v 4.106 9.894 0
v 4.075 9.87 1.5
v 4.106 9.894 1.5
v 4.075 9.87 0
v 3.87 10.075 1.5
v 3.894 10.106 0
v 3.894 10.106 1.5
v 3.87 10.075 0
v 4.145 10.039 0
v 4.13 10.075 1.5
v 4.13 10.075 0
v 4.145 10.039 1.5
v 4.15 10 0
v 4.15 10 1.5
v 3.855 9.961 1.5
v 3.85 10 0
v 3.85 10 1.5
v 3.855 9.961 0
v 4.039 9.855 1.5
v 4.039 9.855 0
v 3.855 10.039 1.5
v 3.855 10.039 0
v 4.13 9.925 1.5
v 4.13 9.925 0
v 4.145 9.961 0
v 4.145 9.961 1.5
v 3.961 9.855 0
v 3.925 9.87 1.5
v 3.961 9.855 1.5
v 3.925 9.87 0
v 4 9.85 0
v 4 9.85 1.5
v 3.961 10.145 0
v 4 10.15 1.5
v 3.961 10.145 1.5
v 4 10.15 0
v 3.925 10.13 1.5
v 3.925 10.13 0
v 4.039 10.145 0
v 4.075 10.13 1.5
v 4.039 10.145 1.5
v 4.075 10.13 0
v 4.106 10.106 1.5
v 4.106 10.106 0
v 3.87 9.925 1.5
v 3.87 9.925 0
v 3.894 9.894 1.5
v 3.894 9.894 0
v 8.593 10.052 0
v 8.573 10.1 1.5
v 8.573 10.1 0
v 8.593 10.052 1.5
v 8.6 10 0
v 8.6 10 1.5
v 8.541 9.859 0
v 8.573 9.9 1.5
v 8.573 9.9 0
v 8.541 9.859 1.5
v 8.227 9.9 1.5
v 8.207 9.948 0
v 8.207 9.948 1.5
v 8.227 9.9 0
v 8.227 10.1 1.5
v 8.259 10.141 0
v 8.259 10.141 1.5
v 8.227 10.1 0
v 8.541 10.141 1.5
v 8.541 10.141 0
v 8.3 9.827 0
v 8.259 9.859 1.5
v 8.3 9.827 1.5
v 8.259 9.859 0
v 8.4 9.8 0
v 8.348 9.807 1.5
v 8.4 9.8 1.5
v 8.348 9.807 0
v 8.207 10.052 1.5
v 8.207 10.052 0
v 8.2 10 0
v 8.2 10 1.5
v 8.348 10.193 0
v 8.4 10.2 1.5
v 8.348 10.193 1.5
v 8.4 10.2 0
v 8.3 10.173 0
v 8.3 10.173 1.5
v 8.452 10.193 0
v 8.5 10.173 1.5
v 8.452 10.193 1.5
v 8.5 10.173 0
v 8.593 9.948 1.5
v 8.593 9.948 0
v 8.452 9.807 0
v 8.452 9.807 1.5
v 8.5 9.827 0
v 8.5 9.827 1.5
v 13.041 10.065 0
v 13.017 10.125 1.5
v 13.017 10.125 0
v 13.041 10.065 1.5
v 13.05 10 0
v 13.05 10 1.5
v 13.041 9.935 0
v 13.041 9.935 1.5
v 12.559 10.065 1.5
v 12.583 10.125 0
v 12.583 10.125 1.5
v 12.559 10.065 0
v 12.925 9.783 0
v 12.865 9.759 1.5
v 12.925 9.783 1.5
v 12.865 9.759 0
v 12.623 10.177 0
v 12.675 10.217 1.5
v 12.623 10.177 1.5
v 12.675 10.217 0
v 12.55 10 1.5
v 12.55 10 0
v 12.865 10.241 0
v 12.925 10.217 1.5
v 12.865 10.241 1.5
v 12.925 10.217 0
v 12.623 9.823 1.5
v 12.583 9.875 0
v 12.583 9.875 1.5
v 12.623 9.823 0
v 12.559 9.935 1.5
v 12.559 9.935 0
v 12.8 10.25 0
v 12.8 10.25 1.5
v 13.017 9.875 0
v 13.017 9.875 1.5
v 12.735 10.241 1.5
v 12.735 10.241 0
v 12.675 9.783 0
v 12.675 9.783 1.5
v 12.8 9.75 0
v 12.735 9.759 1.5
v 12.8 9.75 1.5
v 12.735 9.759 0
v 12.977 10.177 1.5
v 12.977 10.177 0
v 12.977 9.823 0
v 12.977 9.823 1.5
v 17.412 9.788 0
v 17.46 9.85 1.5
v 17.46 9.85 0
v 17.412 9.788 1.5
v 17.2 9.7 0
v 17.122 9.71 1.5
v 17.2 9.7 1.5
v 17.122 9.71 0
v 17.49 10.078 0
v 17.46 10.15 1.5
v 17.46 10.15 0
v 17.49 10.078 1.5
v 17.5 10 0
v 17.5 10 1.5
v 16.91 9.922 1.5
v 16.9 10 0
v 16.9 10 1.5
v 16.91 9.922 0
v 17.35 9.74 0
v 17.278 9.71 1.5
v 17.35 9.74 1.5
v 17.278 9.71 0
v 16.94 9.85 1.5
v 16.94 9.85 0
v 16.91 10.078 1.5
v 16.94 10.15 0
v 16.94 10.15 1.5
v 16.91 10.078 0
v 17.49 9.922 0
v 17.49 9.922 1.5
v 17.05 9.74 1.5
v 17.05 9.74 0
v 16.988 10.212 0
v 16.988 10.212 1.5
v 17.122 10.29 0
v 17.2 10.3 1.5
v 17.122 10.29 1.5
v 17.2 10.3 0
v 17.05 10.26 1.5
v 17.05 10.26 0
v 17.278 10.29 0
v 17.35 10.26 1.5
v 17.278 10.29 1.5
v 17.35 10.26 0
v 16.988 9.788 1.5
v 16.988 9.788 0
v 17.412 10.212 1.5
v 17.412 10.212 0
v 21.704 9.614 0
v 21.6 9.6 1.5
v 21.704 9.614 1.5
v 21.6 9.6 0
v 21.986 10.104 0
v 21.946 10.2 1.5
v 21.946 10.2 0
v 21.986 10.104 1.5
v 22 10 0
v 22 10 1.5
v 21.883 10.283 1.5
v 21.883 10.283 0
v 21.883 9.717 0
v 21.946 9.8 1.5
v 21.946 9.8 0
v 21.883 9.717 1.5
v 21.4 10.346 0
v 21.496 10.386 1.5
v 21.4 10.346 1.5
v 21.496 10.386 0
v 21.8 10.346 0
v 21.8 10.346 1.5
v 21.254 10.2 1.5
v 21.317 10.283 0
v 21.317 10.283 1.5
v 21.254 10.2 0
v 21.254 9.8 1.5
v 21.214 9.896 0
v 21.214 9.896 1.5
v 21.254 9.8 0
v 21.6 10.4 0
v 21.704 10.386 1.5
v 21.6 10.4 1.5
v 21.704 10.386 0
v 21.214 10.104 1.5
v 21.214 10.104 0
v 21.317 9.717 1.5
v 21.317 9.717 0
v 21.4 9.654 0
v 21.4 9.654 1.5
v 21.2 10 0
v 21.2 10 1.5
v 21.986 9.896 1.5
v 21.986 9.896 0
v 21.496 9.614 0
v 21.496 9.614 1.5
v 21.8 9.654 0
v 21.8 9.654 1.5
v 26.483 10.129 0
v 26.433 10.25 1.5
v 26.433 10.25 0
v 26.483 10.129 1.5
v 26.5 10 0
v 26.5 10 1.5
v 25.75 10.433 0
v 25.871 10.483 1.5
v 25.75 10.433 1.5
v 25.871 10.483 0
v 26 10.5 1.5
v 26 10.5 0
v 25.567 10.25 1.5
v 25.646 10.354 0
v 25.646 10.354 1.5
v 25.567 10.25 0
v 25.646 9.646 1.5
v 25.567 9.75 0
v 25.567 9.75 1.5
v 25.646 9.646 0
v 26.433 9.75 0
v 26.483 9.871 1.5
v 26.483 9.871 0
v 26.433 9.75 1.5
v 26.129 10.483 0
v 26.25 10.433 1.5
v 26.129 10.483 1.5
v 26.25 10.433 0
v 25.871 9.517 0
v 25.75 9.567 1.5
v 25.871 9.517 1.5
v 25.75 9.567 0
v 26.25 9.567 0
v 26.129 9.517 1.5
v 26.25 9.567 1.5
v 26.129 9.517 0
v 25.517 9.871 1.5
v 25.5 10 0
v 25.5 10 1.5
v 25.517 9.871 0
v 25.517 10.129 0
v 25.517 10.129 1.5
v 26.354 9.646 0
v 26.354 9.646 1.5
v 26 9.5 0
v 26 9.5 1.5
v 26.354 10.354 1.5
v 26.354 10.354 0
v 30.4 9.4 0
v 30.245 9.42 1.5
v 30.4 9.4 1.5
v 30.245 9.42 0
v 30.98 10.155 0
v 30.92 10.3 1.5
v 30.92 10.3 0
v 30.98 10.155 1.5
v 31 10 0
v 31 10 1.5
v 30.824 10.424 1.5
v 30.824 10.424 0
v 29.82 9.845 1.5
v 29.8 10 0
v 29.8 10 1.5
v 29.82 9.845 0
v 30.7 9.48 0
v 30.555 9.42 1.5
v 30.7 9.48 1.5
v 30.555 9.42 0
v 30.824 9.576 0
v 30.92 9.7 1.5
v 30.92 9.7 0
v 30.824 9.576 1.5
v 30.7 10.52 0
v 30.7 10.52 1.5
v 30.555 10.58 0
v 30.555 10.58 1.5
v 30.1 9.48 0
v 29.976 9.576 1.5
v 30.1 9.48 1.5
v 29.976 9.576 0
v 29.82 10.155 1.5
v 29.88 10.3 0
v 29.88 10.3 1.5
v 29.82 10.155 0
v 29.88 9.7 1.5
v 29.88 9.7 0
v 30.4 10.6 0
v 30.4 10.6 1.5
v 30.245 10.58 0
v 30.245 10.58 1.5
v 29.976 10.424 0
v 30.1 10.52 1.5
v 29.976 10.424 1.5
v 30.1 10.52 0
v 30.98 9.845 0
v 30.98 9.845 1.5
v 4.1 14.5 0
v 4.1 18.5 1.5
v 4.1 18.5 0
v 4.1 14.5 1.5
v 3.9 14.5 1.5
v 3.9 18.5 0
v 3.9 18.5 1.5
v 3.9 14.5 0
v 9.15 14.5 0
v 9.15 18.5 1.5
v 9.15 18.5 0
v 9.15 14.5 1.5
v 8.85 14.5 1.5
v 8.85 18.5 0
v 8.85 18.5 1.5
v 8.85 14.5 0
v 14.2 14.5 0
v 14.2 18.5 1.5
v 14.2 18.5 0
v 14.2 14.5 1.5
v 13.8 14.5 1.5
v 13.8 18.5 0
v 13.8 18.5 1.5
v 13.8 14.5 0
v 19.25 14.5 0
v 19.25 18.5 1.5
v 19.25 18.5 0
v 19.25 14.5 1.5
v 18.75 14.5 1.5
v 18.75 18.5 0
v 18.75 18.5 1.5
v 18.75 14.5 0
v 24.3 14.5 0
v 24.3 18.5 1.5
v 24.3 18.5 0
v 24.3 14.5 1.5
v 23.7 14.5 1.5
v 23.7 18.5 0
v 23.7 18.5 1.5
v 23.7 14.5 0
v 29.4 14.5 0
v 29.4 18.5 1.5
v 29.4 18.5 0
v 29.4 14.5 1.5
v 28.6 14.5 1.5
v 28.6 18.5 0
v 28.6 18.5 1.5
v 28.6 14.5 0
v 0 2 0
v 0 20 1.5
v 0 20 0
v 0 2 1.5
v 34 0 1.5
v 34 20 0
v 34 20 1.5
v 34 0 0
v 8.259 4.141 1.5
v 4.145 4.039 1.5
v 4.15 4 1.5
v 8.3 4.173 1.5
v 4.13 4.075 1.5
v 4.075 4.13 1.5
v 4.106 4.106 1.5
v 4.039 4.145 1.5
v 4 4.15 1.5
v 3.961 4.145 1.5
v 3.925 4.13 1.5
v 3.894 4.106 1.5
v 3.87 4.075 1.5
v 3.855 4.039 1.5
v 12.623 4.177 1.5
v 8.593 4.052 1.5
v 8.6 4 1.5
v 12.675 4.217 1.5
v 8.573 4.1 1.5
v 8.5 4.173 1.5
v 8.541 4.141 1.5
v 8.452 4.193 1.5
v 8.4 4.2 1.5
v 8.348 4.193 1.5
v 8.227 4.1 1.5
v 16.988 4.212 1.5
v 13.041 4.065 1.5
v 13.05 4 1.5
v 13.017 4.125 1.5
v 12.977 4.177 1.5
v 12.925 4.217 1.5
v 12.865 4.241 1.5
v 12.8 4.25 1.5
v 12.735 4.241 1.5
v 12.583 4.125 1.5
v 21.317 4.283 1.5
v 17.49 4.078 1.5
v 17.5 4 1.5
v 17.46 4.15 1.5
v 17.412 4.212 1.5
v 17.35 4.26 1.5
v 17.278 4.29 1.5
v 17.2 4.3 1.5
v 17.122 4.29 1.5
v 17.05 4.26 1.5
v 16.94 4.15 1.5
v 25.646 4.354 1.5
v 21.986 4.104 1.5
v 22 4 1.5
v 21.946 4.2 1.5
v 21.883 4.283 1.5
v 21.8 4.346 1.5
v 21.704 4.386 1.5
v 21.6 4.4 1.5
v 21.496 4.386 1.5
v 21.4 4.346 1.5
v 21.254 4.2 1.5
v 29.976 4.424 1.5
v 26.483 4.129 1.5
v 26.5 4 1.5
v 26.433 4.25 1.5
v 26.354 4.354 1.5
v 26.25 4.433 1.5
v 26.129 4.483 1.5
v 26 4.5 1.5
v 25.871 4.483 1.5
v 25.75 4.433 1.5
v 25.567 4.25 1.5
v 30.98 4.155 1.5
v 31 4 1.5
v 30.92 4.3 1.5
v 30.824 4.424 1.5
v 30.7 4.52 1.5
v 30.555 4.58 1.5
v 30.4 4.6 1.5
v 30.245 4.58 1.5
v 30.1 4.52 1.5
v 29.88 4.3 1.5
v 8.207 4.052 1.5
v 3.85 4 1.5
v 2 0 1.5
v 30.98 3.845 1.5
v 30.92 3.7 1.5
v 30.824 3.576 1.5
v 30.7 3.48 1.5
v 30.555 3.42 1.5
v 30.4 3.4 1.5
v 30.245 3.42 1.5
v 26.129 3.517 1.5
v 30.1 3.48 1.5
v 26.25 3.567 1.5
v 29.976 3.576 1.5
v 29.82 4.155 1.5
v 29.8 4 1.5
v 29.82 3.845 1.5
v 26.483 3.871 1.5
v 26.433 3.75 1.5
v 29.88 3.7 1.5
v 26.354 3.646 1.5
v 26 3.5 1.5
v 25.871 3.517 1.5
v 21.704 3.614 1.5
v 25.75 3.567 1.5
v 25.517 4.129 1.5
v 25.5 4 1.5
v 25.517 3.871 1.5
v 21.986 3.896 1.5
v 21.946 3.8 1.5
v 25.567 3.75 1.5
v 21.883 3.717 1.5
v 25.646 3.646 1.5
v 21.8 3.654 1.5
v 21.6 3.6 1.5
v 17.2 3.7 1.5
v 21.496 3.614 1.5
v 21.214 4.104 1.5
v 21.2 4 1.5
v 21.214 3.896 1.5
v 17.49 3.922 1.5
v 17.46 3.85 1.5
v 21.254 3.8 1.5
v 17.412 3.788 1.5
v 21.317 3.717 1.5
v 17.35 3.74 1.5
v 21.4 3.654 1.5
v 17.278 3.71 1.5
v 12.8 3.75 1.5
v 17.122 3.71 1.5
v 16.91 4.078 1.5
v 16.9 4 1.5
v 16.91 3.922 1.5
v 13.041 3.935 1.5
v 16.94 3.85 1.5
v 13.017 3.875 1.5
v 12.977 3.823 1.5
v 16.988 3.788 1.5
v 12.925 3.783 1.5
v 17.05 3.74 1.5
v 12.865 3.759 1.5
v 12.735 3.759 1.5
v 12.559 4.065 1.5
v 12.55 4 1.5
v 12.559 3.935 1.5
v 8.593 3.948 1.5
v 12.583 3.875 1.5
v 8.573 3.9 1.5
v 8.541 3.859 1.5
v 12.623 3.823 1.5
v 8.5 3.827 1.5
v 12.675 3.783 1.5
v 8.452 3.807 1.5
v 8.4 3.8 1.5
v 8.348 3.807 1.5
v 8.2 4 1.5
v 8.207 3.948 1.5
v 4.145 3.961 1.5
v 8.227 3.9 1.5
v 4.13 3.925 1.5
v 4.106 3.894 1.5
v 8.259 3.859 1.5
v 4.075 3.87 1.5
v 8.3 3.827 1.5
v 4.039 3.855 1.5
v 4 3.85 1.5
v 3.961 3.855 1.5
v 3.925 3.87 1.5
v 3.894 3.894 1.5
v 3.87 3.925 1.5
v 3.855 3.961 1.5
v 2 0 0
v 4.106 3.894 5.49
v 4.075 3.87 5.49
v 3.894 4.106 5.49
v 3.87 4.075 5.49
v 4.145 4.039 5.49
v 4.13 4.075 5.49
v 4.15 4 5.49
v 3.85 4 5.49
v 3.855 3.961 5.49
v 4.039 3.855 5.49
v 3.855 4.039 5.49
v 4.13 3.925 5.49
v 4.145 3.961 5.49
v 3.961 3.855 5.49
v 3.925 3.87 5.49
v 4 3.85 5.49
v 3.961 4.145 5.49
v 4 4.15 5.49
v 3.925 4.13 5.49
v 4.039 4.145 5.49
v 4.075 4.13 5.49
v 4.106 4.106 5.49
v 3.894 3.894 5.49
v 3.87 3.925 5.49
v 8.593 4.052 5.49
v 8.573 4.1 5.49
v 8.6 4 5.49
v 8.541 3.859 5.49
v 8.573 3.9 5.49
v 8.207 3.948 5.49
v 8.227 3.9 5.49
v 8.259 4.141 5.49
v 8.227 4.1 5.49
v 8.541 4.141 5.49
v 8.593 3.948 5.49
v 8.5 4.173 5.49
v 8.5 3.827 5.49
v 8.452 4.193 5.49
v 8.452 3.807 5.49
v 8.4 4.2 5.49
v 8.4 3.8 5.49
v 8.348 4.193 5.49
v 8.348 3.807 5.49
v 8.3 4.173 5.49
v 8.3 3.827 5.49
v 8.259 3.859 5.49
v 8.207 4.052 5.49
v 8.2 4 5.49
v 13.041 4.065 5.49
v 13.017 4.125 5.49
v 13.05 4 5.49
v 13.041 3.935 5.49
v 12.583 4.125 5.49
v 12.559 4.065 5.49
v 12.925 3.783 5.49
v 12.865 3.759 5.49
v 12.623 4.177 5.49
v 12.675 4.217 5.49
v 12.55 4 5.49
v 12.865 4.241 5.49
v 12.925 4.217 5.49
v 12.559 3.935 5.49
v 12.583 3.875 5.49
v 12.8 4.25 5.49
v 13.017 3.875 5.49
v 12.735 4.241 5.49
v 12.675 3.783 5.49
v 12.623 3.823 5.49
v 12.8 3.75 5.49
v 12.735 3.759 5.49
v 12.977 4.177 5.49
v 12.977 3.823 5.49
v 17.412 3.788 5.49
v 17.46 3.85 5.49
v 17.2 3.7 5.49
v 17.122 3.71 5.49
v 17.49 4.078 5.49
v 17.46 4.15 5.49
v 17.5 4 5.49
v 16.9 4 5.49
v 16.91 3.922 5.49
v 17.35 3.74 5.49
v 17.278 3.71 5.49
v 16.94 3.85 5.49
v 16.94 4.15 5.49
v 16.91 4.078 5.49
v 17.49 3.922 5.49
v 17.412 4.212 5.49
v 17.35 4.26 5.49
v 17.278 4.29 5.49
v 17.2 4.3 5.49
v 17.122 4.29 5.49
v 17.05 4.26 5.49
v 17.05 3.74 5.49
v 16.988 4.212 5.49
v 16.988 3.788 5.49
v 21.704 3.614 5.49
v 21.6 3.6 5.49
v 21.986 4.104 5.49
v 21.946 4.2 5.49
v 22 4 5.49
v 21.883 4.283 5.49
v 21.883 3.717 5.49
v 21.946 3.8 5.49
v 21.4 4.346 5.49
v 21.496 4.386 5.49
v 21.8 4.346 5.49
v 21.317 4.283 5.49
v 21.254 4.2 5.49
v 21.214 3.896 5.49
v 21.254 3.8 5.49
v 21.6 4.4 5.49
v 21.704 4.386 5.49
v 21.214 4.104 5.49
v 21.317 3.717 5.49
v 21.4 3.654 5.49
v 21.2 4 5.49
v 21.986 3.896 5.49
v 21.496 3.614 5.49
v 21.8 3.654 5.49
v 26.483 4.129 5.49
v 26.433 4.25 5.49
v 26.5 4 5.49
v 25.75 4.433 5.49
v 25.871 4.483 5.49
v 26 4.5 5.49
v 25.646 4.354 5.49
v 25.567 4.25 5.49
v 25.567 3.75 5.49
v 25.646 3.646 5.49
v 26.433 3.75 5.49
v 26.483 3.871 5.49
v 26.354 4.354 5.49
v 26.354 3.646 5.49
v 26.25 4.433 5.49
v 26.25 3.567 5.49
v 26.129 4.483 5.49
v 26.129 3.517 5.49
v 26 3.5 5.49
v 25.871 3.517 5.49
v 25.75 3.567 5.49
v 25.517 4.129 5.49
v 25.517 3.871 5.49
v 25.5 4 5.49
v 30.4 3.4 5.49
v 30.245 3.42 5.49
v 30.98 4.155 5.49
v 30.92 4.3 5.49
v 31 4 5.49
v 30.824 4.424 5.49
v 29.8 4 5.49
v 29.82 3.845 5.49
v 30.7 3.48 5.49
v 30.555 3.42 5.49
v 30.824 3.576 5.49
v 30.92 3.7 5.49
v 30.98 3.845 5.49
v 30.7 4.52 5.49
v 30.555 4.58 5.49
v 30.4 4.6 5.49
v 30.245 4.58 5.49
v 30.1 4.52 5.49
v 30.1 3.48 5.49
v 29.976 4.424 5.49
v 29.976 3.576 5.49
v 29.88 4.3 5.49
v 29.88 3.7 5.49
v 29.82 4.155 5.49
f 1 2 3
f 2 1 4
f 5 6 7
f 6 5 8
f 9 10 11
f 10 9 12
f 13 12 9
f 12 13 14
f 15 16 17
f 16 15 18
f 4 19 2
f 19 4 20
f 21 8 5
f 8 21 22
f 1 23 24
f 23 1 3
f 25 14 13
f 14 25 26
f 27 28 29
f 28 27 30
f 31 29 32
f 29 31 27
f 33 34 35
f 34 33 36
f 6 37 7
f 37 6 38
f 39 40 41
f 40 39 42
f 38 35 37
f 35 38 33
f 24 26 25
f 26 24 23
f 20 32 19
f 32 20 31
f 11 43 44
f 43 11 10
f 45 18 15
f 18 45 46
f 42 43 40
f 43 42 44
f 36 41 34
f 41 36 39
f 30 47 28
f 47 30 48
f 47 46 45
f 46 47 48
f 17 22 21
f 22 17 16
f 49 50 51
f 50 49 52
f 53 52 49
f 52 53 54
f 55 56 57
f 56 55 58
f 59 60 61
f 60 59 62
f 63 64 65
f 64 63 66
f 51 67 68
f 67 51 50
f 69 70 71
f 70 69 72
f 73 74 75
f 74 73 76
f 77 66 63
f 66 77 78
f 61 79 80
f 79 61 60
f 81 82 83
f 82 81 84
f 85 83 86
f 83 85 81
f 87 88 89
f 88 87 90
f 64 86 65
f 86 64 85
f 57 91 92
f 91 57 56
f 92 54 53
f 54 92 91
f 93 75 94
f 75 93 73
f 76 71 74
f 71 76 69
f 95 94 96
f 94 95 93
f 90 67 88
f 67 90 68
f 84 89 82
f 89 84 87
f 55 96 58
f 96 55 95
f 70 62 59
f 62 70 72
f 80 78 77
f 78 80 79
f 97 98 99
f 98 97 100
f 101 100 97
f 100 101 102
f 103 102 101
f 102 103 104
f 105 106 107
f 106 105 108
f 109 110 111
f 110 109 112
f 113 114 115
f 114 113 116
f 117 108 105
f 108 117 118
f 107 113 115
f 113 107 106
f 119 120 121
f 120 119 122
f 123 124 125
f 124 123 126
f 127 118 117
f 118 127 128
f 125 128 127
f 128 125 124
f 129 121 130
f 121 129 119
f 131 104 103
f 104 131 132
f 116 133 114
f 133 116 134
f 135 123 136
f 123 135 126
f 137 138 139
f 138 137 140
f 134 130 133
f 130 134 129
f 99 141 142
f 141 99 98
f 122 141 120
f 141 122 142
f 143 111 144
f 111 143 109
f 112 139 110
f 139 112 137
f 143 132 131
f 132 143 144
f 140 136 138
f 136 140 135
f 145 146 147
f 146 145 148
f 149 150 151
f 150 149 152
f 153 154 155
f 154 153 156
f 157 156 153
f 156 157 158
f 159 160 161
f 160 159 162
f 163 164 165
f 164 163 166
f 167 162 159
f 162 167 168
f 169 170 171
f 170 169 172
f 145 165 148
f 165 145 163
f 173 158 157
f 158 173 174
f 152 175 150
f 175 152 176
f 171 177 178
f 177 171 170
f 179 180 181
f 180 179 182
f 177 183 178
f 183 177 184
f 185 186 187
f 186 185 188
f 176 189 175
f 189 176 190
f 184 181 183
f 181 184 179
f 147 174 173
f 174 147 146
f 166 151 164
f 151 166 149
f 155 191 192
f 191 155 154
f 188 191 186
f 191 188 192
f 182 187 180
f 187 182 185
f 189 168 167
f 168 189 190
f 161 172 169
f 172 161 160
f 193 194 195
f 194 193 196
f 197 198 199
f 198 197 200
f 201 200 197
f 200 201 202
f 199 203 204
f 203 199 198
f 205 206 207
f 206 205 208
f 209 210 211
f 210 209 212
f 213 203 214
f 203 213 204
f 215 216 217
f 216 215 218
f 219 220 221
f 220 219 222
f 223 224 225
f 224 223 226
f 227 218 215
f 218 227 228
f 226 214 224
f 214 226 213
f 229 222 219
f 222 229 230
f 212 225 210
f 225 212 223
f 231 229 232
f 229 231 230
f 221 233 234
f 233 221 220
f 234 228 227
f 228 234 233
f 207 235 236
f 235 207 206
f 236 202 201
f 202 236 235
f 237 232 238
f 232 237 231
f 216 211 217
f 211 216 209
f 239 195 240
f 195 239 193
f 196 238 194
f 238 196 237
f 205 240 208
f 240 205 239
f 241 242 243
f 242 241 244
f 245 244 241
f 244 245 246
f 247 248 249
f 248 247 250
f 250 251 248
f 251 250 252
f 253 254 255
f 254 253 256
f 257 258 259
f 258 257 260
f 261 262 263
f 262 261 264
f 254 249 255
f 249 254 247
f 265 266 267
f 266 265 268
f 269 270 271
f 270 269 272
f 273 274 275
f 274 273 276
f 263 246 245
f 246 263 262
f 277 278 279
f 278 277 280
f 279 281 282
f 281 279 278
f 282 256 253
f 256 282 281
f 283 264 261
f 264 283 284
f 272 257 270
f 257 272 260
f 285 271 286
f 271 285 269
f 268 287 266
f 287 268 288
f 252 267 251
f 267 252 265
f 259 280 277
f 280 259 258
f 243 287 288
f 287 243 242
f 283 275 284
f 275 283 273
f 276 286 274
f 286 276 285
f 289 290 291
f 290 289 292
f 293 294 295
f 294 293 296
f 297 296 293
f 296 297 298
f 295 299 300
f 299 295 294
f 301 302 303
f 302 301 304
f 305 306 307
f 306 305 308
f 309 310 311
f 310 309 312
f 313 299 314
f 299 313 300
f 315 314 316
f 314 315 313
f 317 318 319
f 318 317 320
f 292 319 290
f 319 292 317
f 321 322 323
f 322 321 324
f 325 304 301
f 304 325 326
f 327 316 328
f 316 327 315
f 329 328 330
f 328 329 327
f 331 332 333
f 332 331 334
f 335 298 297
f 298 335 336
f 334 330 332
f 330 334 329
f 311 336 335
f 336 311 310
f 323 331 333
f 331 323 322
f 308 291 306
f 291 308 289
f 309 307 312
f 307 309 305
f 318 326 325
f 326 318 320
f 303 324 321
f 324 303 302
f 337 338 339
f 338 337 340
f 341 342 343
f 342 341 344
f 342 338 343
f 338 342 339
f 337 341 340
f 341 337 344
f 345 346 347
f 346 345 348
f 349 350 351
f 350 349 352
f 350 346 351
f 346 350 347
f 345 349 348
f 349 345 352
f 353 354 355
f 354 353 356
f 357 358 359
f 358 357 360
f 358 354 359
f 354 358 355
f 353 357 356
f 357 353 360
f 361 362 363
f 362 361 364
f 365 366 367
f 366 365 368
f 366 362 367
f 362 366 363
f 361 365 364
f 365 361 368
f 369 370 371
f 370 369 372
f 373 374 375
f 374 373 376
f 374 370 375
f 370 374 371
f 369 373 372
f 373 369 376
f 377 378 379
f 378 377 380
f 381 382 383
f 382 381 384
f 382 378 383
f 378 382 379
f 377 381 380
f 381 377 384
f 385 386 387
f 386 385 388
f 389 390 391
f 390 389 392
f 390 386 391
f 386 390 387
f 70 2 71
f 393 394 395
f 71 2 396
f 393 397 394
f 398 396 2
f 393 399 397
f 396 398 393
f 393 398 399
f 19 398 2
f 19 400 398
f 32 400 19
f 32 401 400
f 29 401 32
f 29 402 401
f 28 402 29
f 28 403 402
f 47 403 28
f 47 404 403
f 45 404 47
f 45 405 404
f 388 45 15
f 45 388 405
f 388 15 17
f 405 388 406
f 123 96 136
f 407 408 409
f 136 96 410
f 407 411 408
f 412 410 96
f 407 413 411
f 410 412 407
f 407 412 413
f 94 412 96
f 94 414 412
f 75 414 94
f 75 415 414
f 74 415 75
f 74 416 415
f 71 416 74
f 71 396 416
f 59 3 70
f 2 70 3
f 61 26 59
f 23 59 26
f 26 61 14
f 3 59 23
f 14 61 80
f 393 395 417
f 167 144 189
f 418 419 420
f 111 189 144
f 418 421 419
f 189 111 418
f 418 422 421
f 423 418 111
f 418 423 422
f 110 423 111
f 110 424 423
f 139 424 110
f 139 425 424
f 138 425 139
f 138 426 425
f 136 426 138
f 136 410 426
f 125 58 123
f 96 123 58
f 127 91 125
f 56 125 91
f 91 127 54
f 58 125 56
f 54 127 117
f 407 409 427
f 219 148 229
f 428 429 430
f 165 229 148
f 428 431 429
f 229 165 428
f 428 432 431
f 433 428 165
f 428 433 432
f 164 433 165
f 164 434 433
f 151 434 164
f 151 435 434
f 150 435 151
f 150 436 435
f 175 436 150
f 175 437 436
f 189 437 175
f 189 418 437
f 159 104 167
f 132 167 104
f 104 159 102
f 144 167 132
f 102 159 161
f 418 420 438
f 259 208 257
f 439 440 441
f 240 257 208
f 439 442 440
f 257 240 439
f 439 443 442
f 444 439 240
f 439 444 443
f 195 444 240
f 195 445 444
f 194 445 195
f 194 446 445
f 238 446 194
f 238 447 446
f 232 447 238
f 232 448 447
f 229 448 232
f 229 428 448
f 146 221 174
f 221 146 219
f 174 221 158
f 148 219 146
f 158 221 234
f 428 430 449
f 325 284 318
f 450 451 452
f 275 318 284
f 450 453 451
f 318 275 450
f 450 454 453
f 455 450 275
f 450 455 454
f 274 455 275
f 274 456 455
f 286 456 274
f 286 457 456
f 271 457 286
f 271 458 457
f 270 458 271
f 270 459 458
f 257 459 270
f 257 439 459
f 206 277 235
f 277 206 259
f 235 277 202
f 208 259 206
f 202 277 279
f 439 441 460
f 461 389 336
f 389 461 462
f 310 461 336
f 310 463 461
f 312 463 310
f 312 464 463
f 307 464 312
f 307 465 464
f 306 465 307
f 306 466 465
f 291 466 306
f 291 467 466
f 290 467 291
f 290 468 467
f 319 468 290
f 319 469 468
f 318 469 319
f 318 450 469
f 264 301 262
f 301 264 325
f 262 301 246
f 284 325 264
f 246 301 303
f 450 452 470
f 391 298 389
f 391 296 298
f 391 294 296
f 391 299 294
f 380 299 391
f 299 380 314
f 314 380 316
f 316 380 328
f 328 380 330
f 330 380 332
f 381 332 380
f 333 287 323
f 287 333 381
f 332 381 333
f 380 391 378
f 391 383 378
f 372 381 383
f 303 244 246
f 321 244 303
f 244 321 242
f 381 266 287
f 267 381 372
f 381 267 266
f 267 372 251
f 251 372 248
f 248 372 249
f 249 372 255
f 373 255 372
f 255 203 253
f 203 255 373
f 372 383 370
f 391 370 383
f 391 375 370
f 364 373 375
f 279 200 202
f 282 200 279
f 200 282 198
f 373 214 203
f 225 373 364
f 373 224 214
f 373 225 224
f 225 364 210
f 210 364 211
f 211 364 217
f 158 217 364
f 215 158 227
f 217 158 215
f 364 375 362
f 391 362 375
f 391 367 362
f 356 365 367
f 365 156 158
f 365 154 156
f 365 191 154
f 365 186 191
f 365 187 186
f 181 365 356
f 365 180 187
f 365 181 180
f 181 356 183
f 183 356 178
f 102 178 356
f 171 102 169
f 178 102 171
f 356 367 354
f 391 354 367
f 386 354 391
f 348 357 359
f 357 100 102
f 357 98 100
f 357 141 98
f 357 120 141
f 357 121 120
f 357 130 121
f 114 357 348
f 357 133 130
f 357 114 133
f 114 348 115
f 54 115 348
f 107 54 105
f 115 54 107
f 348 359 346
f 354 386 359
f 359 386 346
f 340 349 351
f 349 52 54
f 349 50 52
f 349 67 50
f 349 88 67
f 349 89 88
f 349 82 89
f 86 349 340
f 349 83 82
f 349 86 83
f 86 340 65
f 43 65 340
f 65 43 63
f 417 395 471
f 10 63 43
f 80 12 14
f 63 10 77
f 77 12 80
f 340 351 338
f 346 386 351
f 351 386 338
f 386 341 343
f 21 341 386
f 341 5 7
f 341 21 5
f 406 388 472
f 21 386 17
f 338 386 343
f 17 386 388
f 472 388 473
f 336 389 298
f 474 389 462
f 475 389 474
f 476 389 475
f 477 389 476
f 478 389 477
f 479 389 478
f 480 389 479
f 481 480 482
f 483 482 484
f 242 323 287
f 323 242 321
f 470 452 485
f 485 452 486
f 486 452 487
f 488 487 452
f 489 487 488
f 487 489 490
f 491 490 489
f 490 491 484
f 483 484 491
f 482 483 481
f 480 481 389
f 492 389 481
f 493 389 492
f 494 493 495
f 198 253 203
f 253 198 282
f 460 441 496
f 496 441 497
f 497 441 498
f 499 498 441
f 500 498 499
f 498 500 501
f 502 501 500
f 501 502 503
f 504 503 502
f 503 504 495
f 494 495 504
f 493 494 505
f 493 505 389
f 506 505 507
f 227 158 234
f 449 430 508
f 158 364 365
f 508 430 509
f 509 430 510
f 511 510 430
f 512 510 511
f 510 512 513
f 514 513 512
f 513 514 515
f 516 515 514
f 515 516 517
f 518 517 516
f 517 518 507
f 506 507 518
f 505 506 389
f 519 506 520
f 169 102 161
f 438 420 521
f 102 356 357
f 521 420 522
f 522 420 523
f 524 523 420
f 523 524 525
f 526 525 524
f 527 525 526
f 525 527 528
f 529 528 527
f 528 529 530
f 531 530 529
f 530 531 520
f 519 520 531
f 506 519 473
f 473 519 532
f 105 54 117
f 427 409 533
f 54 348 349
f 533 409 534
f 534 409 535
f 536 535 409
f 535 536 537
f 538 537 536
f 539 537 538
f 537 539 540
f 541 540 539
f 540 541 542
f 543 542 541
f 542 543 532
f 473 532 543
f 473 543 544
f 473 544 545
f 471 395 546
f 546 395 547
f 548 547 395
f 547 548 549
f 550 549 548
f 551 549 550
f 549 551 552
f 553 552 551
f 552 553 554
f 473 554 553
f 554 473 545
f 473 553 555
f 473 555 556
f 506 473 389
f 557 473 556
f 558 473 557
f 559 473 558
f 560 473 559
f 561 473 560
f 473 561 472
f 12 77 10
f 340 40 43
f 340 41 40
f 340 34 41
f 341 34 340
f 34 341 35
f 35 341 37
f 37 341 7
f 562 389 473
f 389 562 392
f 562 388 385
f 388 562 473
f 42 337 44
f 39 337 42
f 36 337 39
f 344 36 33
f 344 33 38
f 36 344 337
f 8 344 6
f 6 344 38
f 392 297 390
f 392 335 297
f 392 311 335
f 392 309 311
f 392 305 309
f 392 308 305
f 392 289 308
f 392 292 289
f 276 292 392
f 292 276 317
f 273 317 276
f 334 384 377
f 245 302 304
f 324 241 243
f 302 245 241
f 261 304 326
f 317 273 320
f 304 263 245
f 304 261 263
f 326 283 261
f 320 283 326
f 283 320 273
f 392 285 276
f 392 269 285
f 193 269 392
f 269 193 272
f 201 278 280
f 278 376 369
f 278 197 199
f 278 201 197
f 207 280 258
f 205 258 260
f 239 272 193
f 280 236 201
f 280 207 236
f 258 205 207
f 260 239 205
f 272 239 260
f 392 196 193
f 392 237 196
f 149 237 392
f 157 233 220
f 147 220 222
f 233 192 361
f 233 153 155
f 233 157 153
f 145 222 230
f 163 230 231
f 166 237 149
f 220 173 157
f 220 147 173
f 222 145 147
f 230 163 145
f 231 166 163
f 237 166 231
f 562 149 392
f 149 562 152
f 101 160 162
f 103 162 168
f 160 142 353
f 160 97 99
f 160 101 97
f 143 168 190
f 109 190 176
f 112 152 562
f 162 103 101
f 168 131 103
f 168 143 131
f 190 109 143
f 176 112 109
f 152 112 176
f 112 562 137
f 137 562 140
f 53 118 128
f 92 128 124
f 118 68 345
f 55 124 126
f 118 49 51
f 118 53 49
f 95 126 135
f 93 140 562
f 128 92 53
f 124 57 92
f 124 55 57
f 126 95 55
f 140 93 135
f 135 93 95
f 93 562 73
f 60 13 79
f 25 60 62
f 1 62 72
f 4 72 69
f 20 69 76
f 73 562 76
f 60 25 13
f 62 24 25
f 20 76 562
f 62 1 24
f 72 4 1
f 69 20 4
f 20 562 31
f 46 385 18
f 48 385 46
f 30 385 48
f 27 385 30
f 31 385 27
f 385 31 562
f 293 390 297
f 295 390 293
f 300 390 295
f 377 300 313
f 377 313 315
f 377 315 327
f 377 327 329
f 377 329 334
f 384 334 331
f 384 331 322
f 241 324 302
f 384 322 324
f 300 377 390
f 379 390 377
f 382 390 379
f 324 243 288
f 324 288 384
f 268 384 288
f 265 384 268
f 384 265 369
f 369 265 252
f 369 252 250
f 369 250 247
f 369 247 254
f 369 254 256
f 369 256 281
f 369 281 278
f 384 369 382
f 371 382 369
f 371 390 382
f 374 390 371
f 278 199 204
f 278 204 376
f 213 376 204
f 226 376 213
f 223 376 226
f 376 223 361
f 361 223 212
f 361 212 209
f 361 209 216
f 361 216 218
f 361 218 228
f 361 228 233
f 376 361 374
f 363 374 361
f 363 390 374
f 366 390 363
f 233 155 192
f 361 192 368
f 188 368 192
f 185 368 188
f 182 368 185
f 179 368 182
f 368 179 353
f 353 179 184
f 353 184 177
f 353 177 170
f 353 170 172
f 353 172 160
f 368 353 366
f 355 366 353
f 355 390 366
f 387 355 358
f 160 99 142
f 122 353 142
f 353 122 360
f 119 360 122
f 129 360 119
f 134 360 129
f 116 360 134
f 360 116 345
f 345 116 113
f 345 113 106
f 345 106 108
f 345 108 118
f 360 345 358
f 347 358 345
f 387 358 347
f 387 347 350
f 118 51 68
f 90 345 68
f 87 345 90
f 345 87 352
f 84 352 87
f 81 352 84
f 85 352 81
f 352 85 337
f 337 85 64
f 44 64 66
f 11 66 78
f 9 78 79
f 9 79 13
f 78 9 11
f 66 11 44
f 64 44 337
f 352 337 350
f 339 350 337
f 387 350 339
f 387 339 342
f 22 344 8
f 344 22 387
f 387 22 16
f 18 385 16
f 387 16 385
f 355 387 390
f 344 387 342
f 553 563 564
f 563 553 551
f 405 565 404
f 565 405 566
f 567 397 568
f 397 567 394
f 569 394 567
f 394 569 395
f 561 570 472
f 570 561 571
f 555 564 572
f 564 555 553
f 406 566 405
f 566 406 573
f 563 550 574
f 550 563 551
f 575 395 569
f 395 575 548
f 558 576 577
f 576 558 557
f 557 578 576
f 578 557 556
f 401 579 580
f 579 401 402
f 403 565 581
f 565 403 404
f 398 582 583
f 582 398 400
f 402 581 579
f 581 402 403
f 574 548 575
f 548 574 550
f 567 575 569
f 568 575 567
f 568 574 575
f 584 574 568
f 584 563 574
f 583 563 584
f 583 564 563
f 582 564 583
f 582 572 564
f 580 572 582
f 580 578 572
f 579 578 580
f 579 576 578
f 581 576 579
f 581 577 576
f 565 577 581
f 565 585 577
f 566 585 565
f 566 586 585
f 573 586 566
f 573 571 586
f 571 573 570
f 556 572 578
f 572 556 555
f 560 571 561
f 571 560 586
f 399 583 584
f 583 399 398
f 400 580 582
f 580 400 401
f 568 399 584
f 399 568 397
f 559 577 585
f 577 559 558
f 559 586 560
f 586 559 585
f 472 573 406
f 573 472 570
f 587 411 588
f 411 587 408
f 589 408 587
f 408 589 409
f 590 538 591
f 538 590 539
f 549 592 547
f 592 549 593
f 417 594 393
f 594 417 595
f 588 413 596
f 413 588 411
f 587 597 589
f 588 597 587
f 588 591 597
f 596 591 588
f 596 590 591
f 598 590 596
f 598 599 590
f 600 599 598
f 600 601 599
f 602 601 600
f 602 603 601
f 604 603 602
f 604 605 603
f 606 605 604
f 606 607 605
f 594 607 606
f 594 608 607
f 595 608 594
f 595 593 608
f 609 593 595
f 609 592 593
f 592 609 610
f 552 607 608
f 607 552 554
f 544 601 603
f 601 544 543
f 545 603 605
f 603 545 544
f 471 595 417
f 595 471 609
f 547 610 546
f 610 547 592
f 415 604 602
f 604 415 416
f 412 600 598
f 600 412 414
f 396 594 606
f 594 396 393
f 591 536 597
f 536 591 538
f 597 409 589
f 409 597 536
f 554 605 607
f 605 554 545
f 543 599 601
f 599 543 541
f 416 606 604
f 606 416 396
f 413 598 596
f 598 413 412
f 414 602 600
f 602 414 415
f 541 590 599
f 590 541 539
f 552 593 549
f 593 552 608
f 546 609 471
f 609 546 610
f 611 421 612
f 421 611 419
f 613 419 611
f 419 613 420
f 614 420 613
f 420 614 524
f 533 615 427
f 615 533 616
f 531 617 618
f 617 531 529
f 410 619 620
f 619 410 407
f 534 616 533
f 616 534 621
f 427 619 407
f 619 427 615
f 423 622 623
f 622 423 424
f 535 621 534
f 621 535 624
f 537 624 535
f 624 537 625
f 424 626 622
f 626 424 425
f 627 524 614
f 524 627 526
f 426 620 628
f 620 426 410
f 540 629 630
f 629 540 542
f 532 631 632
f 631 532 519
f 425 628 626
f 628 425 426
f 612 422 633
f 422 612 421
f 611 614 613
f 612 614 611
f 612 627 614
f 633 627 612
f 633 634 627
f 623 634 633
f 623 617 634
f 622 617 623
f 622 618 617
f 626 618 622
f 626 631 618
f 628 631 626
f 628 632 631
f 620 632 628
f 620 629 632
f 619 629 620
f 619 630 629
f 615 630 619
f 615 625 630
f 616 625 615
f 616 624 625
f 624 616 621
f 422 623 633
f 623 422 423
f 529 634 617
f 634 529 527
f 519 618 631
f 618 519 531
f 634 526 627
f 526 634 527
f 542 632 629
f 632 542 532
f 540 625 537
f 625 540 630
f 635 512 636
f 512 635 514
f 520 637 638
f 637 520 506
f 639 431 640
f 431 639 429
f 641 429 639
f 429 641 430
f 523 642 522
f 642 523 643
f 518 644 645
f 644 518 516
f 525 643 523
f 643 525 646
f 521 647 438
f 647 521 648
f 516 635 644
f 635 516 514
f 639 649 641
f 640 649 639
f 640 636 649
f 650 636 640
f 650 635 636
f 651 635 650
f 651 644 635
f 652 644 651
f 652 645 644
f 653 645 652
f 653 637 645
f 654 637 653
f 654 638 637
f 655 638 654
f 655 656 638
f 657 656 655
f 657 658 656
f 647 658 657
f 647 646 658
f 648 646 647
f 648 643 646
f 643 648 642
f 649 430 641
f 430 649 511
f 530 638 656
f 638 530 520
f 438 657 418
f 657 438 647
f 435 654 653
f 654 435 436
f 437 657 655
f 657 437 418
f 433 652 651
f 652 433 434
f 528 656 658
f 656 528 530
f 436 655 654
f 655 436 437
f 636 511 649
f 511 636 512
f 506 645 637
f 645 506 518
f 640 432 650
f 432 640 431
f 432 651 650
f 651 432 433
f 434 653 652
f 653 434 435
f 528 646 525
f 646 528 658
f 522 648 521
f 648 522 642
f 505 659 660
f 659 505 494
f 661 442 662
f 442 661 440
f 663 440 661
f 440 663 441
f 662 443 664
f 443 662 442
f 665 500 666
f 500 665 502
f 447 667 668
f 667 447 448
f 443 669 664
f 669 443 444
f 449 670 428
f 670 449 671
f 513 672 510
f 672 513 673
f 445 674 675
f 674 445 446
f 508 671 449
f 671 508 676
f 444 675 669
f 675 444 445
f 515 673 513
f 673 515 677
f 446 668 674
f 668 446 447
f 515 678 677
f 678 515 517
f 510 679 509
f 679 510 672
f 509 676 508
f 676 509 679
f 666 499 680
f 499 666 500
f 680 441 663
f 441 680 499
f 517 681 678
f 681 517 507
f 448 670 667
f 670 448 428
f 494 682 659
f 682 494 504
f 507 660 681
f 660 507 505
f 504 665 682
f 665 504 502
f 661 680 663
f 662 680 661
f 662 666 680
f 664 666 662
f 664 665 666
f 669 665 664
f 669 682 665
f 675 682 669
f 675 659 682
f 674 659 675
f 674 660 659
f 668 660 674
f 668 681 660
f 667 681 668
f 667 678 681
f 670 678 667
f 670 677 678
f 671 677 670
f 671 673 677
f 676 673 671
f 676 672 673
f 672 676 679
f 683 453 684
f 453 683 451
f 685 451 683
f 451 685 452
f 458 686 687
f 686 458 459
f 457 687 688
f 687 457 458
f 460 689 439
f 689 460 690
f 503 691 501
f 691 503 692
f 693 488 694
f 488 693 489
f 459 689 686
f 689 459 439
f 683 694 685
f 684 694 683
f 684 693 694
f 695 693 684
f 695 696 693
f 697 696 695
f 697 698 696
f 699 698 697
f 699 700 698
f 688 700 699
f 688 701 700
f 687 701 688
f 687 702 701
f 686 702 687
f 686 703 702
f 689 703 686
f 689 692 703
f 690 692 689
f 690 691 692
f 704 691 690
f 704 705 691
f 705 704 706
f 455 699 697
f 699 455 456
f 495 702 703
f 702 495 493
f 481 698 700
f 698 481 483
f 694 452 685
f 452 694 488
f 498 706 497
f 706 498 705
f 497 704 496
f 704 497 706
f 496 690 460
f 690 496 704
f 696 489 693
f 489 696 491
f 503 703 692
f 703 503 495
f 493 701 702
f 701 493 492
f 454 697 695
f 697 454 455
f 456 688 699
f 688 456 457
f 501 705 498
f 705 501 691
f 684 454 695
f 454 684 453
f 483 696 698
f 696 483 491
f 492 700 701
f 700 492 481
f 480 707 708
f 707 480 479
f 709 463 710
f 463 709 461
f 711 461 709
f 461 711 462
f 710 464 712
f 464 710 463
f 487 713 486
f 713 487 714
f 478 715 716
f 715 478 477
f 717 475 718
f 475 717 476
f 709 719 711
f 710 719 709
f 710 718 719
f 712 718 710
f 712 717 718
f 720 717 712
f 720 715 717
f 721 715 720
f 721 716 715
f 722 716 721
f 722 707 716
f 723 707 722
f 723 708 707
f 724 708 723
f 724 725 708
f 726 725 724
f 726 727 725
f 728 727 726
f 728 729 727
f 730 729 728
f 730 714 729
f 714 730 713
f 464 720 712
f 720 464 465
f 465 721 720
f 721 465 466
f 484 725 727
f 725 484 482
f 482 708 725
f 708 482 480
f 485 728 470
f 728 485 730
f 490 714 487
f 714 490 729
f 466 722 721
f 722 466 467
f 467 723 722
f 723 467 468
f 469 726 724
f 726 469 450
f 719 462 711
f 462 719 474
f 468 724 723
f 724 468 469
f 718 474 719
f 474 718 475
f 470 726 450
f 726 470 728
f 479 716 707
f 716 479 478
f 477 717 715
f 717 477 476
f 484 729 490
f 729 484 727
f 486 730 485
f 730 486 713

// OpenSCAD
// TinyMaker Resin Lab - kaištukai, skylutės ir plyšiai (paprastas modelis).
// Greitas, pigus spaudinys: plokštelė 34 × 20 × 1,5 mm, ~1,0 ml.
//   1 eilė: kaištukai Ø0,3-1,2 mm, 4 mm aukščio - ploniausias išlikęs = Regular užtenka.
//   2 eilė: skylutės kiaurai Ø0,3-1,2 mm - užakusios = per ilga ekspozicija.
//   3 eilė: plyšiai kiaurai 0,2-0,8 mm.
// Nupjautas kampas rodo, kuri eilė kuri (kampas - prie ploniausių).
// STL: openscad -o TM_kaistukai.stl tm_kaistukai.scad

$fn = 24;
W = 34; D = 20; T = 1.5;
dia = [0.3, 0.4, 0.5, 0.6, 0.8, 1.0, 1.2];
gaps = [0.2, 0.3, 0.4, 0.5, 0.6, 0.8];
x0 = 4; dx = 4.4;

difference() {
  linear_extrude(T)
    polygon([[2, 0], [W, 0], [W, D], [0, D], [0, 2]]);
  for (i = [0 : len(dia) - 1])
    translate([x0 + i * dx, 10, -1]) cylinder(d = dia[i], h = T + 2);
  for (i = [0 : len(gaps) - 1])
    translate([x0 + i * 5 - gaps[i] / 2, 14.5, -1]) cube([gaps[i], 4, T + 2]);
}
for (i = [0 : len(dia) - 1])
  translate([x0 + i * dx, 4, T - 0.01]) cylinder(d = dia[i], h = 4);
